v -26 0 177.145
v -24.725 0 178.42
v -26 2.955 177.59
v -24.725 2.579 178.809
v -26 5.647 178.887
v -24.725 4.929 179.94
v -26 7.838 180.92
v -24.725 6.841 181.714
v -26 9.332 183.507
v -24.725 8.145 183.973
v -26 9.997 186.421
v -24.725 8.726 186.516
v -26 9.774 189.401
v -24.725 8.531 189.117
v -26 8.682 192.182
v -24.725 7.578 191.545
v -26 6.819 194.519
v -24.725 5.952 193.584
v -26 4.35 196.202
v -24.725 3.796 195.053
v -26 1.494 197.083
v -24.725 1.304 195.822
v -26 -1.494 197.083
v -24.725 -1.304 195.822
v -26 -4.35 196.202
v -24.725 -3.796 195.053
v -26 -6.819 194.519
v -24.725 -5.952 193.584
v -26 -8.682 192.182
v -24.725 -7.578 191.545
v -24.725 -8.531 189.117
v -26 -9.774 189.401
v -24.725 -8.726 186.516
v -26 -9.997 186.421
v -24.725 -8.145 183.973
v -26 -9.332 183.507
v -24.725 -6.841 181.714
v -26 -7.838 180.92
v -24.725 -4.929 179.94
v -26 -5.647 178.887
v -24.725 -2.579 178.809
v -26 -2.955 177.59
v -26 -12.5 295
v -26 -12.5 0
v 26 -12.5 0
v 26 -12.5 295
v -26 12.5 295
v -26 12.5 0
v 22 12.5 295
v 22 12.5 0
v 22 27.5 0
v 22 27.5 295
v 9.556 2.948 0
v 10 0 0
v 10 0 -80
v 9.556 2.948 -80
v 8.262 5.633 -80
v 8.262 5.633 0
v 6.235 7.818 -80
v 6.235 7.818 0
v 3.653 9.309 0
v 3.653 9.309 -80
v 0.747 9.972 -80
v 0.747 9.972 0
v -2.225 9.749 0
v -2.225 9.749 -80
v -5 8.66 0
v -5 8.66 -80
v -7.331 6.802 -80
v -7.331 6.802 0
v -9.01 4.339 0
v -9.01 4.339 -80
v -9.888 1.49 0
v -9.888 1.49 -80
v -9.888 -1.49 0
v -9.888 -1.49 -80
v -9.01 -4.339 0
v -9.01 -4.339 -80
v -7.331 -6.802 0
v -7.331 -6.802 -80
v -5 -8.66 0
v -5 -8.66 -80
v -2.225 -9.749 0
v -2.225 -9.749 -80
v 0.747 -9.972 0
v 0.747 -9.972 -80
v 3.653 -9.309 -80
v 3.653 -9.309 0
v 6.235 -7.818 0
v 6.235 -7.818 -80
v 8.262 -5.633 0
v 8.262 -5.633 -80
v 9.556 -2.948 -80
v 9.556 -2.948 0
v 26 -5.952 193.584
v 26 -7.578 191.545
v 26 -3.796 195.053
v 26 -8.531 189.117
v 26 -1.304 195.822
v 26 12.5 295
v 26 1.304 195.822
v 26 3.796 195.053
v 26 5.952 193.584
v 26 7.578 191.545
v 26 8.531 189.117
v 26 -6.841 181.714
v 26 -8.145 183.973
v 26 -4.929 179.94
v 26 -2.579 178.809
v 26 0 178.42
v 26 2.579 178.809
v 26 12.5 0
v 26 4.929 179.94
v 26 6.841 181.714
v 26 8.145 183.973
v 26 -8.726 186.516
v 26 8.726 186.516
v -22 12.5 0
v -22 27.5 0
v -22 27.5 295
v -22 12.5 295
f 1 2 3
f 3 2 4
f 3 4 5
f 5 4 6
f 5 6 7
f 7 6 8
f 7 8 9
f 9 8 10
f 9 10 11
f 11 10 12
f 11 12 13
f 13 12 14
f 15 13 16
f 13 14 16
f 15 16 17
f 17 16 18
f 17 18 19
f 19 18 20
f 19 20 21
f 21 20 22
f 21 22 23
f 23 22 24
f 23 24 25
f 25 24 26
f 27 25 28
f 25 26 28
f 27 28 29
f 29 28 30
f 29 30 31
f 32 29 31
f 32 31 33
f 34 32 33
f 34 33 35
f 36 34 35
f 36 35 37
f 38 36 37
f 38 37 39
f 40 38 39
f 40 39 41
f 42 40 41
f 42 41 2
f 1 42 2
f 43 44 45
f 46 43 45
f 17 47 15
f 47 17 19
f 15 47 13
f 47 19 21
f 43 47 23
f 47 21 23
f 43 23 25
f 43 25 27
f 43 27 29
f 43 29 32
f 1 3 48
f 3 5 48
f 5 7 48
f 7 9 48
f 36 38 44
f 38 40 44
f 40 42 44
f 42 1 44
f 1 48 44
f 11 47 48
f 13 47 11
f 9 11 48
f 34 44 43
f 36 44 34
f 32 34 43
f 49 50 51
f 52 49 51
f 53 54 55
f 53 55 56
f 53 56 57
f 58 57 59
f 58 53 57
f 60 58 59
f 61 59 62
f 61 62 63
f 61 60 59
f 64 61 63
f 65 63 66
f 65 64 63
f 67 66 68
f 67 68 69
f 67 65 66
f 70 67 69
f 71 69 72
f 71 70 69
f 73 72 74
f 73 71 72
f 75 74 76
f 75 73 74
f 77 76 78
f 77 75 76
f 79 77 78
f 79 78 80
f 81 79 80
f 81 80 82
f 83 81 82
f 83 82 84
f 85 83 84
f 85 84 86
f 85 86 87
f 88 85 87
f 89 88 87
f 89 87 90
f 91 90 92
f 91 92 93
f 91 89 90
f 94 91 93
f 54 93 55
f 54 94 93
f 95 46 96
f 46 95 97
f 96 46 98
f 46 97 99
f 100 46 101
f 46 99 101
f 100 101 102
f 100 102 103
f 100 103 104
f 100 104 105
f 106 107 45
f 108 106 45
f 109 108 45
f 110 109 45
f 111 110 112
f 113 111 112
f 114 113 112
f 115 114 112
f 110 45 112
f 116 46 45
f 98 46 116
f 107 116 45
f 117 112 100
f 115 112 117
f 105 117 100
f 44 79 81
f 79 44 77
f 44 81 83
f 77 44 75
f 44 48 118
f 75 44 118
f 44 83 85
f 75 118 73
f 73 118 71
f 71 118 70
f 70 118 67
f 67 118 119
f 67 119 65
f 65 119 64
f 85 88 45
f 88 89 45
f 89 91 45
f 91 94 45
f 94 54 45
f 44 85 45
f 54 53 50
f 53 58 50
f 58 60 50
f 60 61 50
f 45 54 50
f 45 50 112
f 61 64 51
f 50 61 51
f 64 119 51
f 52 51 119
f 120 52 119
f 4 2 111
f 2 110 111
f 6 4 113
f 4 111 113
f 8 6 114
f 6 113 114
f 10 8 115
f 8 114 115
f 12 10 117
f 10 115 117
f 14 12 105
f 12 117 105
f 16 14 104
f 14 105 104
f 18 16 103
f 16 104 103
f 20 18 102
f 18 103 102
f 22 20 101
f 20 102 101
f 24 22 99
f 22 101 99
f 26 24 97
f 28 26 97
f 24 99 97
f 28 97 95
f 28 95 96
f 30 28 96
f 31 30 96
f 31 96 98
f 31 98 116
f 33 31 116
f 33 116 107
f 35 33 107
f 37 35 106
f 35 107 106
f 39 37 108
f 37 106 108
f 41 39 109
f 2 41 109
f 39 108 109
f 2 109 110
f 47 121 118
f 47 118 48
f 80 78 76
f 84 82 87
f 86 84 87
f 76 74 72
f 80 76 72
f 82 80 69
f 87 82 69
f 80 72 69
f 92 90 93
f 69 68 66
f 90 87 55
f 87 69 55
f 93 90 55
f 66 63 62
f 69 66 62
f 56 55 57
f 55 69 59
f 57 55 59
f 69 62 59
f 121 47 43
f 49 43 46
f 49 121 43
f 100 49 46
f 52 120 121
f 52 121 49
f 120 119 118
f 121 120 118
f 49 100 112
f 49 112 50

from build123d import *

# Parameters (mm, degrees)
BOSS_EXTRUDE1_DEPTH          = 295
SKETCH3_R                    = 10
BOSS_EXTRUDE3_DEPTH          = 80
M20_TAPPED_HOLE1_D           = 17.5
M20_TAPPED_HOLE1_CSINK_D     = 20.05
M20_TAPPED_HOLE1_CSINK_ANGLE = 90


with BuildPart() as part:
    # Sketch1 → Boss-Extrude1 (new body)
    with BuildSketch(Plane.XY):
        Polygon((-26, -12.5), (26, -12.5), (26, 12.5), (22, 12.5), (22, 27.5), (-22, 27.5), (-22, 12.5), (-26, 12.5), align=None)
    extrude(amount=BOSS_EXTRUDE1_DEPTH)

    # Sketch3 → Boss-Extrude3 (add)
    with BuildSketch(Plane.XY):
        Circle(SKETCH3_R)
    extrude(amount=-BOSS_EXTRUDE3_DEPTH)

    # M20 Tapped Hole1 (through all)
    with Locations(Plane.ZY.offset(26)):
        with Locations((187.17, 0)):
            CounterSinkHole(M20_TAPPED_HOLE1_D / 2, M20_TAPPED_HOLE1_CSINK_D / 2, counter_sink_angle=M20_TAPPED_HOLE1_CSINK_ANGLE)


solid = part.part
